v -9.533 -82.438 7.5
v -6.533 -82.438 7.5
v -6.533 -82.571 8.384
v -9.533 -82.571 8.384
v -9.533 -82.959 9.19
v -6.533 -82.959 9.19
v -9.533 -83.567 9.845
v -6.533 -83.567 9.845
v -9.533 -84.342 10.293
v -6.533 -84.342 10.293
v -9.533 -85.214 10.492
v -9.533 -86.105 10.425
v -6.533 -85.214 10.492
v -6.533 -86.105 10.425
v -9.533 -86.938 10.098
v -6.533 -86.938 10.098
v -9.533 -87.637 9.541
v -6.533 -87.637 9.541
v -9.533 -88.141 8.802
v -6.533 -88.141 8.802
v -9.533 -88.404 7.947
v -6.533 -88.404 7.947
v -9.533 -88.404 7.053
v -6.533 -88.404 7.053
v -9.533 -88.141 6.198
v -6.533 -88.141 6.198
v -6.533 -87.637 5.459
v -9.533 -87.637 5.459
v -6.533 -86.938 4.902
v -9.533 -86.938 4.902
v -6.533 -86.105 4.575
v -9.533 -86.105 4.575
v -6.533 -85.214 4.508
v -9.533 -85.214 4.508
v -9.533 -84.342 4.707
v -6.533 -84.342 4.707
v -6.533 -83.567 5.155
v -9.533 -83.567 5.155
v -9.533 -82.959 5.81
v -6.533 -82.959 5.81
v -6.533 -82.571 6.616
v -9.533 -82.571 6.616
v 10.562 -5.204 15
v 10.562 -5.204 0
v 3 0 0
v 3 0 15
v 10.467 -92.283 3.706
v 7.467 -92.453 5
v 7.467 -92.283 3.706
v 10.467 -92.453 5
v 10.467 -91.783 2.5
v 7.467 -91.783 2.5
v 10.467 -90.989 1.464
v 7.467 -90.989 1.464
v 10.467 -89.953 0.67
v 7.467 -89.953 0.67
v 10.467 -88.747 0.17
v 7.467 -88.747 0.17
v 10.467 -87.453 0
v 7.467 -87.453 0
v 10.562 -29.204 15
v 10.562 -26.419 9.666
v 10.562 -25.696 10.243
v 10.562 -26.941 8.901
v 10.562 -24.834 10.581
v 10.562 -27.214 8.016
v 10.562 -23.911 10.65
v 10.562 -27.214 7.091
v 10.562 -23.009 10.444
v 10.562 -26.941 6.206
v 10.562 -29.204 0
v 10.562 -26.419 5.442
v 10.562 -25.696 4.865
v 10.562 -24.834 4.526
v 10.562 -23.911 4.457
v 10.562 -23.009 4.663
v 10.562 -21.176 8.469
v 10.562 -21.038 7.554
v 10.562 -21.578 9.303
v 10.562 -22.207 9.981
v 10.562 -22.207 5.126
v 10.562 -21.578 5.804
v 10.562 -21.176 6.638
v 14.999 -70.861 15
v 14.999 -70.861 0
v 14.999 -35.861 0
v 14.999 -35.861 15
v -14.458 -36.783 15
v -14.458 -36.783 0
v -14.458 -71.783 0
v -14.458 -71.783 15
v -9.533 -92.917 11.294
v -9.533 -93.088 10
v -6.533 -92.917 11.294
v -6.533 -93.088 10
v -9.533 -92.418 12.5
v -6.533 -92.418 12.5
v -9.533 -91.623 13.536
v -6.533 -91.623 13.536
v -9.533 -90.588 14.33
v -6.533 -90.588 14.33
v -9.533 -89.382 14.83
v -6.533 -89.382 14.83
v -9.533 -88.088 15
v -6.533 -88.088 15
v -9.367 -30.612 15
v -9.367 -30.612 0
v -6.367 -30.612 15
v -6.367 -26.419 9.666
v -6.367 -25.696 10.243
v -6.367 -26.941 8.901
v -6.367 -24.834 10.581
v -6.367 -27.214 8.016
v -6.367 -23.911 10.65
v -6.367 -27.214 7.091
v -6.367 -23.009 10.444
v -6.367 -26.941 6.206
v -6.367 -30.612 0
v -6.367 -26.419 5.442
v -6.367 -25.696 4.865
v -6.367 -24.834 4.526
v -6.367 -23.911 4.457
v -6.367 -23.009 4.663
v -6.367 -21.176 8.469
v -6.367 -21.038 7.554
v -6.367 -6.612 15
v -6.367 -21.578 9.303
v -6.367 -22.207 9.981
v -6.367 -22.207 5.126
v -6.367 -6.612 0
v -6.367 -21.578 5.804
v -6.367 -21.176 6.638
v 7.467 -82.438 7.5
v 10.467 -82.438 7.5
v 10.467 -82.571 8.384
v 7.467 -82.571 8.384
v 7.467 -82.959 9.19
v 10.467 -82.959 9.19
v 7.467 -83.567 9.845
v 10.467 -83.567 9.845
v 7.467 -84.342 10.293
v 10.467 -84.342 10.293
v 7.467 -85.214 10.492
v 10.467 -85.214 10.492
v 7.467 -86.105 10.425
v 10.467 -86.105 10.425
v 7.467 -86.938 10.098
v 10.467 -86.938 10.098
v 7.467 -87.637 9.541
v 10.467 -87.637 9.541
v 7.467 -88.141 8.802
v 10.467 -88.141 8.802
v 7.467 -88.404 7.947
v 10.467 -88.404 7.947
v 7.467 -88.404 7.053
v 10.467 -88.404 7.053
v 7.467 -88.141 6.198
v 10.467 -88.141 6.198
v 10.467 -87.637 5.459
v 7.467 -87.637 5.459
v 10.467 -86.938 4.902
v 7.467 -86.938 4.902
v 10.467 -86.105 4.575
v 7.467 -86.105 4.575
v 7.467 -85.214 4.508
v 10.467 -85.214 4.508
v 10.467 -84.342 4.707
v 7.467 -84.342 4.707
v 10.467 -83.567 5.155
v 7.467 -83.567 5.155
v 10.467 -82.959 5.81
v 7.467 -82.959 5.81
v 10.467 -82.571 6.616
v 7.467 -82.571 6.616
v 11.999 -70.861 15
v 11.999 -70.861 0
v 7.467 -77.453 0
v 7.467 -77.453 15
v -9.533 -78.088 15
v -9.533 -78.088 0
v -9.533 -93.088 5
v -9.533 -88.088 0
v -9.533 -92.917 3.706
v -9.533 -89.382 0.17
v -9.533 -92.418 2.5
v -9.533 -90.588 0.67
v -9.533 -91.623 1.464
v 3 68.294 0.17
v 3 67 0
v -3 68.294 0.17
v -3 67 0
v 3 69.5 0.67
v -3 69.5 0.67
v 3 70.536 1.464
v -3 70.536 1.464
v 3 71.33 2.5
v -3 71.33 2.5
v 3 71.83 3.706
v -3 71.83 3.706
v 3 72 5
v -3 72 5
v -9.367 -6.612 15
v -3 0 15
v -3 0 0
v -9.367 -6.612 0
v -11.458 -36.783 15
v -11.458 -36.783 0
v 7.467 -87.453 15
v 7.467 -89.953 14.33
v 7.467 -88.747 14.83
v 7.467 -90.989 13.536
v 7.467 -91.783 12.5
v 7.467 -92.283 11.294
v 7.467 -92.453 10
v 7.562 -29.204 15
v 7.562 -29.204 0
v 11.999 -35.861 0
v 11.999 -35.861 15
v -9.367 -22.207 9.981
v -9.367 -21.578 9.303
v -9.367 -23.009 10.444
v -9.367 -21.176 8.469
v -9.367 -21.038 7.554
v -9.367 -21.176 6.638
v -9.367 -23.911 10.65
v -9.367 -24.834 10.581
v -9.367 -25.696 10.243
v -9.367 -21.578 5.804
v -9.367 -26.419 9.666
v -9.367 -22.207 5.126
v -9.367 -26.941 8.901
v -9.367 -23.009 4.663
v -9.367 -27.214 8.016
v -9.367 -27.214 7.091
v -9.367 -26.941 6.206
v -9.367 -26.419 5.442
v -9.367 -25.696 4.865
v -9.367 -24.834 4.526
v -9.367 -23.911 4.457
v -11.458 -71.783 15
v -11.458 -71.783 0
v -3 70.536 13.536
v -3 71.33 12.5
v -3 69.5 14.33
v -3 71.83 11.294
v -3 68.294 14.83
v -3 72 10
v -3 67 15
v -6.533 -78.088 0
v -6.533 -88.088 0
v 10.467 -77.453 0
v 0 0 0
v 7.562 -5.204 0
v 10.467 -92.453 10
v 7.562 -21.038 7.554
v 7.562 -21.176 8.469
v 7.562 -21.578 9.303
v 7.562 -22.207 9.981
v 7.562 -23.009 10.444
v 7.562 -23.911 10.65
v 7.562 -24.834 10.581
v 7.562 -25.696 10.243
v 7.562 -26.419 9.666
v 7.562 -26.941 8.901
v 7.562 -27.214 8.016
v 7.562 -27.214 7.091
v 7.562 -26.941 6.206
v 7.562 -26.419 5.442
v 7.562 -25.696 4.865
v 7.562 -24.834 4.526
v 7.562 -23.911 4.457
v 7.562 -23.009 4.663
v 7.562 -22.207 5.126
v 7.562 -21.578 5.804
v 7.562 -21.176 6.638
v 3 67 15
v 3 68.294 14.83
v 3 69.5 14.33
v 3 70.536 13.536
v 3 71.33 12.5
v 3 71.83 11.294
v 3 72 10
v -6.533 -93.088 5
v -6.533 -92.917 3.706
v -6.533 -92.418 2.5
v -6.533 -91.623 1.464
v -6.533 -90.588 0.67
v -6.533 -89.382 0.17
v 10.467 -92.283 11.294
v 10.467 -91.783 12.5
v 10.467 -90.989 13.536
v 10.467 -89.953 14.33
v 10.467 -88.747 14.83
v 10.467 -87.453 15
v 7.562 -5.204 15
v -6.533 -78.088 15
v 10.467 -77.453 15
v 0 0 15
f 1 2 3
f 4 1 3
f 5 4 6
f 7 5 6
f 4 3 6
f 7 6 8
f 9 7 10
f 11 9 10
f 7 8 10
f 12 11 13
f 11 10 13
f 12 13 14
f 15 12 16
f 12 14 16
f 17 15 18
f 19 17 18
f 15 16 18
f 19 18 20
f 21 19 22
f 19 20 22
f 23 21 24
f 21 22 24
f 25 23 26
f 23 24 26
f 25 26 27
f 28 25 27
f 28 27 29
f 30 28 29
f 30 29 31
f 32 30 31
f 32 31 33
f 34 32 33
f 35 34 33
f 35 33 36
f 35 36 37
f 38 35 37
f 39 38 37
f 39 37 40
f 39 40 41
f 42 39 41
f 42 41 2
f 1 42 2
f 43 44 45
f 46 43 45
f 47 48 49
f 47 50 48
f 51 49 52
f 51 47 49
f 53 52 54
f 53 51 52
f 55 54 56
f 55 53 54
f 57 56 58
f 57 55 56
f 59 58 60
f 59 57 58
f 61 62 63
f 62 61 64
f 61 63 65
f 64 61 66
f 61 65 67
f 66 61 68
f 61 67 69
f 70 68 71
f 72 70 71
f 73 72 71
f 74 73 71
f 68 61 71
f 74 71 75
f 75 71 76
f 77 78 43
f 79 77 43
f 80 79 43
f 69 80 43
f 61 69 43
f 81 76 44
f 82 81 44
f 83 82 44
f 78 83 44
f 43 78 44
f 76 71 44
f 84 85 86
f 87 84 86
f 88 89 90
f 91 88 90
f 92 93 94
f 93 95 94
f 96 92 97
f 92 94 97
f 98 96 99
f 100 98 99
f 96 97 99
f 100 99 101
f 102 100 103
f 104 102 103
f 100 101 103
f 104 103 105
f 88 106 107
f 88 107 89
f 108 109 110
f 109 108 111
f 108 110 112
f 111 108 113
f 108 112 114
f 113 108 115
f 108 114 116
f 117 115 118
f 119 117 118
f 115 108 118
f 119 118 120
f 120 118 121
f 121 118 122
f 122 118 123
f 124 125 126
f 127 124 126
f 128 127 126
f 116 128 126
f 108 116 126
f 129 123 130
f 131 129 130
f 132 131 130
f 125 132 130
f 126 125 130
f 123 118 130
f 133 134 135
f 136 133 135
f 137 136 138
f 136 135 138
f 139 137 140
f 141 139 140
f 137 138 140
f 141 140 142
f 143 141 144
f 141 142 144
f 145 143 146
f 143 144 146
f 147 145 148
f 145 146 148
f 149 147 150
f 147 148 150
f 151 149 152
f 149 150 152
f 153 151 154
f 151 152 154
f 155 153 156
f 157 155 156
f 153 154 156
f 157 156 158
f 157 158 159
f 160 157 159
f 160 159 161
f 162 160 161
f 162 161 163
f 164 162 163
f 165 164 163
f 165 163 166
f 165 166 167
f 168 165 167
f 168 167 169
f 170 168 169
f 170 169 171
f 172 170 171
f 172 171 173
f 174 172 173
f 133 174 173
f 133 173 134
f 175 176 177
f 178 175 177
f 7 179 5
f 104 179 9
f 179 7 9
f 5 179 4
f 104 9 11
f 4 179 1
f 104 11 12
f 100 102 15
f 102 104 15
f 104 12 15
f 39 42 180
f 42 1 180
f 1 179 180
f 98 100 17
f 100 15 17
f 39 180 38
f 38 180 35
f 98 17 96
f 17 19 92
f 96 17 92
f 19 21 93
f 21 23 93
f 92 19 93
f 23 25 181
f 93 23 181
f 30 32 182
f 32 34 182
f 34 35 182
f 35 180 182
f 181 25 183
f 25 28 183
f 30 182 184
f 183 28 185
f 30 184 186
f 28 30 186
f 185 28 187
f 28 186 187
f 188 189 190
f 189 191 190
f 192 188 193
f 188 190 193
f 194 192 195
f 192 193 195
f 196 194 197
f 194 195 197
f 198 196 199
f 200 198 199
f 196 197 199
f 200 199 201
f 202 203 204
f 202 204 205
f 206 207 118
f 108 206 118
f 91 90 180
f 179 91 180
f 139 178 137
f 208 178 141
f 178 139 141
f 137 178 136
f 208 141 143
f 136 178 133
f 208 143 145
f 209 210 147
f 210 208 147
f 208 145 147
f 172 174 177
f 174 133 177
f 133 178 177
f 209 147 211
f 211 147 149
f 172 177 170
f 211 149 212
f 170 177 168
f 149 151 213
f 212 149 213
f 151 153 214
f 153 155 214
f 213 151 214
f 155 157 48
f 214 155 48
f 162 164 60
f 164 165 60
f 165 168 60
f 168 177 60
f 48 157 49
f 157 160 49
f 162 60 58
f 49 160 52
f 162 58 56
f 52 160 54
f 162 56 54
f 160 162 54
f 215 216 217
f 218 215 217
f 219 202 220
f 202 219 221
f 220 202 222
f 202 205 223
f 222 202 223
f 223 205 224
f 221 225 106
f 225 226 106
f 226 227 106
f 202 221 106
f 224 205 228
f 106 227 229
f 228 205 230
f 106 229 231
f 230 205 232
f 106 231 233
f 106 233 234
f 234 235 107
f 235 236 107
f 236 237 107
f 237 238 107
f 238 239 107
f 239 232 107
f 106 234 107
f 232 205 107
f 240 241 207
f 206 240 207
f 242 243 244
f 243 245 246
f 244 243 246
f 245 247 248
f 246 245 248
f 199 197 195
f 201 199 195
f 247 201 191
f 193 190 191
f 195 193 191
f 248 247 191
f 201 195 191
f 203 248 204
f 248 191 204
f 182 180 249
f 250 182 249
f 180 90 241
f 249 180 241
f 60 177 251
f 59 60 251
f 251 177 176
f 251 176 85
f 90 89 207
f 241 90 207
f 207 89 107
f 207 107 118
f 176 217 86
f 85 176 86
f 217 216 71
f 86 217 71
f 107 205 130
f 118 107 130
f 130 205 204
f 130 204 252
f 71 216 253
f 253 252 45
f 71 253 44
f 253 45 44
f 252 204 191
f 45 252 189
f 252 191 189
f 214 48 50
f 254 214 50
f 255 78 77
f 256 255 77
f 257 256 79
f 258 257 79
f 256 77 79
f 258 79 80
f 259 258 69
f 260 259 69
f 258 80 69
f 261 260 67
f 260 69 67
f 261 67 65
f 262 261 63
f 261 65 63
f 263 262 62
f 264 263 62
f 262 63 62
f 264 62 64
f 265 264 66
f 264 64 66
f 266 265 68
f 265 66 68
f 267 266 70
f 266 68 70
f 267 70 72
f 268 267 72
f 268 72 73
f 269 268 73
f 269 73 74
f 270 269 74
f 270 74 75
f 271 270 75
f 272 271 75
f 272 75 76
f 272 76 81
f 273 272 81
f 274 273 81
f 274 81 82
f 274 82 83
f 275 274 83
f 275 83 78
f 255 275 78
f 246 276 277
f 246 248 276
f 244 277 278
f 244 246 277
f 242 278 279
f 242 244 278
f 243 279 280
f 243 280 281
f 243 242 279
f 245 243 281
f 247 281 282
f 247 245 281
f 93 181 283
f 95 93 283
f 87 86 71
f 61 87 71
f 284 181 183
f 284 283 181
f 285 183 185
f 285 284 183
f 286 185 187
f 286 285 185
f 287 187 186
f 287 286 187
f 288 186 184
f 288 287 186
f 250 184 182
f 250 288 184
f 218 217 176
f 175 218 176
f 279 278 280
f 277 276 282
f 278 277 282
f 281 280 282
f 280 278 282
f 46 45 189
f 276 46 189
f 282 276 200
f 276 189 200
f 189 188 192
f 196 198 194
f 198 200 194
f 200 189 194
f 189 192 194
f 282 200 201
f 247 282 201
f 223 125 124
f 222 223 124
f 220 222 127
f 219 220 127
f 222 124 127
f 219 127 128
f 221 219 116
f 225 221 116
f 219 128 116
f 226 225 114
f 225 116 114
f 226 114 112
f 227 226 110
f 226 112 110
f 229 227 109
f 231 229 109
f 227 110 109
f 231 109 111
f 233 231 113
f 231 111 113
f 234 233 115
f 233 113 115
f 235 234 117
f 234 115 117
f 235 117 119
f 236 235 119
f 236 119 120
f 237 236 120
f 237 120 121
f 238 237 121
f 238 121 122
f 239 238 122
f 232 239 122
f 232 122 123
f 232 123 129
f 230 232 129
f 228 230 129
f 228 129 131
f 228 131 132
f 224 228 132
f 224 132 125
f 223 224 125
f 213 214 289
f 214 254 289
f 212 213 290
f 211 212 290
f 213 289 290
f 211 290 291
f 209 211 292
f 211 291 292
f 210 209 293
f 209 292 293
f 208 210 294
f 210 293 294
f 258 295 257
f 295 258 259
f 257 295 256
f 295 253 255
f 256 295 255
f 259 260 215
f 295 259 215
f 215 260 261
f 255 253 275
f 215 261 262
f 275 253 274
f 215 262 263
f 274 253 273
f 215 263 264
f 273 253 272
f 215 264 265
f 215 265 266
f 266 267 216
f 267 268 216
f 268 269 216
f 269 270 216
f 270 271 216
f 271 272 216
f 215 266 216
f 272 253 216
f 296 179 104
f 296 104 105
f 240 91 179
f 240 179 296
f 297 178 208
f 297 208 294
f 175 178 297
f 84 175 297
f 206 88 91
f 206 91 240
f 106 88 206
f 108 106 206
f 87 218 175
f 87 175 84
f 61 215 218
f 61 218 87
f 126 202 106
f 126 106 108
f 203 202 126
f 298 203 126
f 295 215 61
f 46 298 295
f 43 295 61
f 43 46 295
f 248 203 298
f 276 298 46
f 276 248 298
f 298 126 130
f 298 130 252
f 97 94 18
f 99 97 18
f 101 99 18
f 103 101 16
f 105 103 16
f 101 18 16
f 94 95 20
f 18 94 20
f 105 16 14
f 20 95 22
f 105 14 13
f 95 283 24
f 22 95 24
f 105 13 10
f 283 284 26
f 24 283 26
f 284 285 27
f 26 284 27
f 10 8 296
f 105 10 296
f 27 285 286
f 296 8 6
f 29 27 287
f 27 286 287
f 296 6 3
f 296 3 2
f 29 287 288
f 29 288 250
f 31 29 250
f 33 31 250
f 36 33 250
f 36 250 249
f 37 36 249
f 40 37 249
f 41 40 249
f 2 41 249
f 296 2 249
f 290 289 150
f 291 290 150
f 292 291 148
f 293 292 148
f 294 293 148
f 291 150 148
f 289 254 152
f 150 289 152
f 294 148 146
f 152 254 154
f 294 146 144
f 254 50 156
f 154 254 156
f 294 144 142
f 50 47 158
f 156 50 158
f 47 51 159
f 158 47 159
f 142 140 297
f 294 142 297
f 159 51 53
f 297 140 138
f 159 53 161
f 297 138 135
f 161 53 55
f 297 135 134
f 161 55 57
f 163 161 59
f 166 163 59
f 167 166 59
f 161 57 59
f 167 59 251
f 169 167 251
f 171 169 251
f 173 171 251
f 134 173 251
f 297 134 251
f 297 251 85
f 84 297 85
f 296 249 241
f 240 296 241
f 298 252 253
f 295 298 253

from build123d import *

# Parameters (mm, degrees)
F1_DEPTH = 15
F2_R     = 5
F3_R     = 5
F4_R     = 3.105154
F5_DEPTH = 25
F6_R     = 3
F7_DEPTH = 25


with BuildPart() as f1:
    # F0 (on Top) → F1 (new body)
    with BuildSketch(Plane.XY):
        Polygon((3, 72), (-3, 72), (-3, 0), (-9.367348, -6.612246), (-9.367348, -30.612246), (-14.458097, -36.783492), (-14.458097, -71.783492), (-9.532944, -78.087687), (-9.532944, -93.087687), (-6.532944, -93.087687), (-6.532944, -78.087687), (-11.458097, -71.783492), (-11.458097, -36.783492), (-6.367348, -30.612246), (-6.367348, -6.612246), (0, 0), (7.561686, -5.204405), (7.561686, -29.204405), (11.999285, -35.860809), (11.999285, -70.860809), (7.467056, -77.453145), (7.467056, -92.453145), (10.467056, -92.453145), (10.467056, -77.453145), (14.999285, -70.860809), (14.999285, -35.860809), (10.561686, -29.204405), (10.561686, -5.204405), (3, 0), align=None)
    extrude(amount=F1_DEPTH)

    # F2
    f2_edges = [f1.edges().sort_by_distance(p)[0] for p in [
        (-8.032944, -93.087687, 15),
        (-8.032944, -93.087687, 0),
        (8.967056, -92.453145, 15),
        (8.967056, -92.453145, 0),
    ]]
    fillet(f2_edges, radius=F2_R)

    # F3
    f3_edges = [f1.edges().sort_by_distance(p)[0] for p in [
        (0, 72, 15),
        (0, 72, 0),
    ]]
    fillet(f3_edges, radius=F3_R)

    # F4 (on face) → F5 (cut)
    with BuildSketch(Plane.YZ.offset(10.561686)):
        with Locations((-24.143221, 7.553654)):
            Circle(F4_R)
    extrude(amount=-F5_DEPTH, mode=Mode.SUBTRACT)

    # F6 (on face) → F7 (cut)
    with BuildSketch(Plane.YZ.offset(10.467056)):
        with Locations((-85.437857, 7.5)):
            Circle(F6_R)
    extrude(amount=-F7_DEPTH, mode=Mode.SUBTRACT)


solid = f1.part
